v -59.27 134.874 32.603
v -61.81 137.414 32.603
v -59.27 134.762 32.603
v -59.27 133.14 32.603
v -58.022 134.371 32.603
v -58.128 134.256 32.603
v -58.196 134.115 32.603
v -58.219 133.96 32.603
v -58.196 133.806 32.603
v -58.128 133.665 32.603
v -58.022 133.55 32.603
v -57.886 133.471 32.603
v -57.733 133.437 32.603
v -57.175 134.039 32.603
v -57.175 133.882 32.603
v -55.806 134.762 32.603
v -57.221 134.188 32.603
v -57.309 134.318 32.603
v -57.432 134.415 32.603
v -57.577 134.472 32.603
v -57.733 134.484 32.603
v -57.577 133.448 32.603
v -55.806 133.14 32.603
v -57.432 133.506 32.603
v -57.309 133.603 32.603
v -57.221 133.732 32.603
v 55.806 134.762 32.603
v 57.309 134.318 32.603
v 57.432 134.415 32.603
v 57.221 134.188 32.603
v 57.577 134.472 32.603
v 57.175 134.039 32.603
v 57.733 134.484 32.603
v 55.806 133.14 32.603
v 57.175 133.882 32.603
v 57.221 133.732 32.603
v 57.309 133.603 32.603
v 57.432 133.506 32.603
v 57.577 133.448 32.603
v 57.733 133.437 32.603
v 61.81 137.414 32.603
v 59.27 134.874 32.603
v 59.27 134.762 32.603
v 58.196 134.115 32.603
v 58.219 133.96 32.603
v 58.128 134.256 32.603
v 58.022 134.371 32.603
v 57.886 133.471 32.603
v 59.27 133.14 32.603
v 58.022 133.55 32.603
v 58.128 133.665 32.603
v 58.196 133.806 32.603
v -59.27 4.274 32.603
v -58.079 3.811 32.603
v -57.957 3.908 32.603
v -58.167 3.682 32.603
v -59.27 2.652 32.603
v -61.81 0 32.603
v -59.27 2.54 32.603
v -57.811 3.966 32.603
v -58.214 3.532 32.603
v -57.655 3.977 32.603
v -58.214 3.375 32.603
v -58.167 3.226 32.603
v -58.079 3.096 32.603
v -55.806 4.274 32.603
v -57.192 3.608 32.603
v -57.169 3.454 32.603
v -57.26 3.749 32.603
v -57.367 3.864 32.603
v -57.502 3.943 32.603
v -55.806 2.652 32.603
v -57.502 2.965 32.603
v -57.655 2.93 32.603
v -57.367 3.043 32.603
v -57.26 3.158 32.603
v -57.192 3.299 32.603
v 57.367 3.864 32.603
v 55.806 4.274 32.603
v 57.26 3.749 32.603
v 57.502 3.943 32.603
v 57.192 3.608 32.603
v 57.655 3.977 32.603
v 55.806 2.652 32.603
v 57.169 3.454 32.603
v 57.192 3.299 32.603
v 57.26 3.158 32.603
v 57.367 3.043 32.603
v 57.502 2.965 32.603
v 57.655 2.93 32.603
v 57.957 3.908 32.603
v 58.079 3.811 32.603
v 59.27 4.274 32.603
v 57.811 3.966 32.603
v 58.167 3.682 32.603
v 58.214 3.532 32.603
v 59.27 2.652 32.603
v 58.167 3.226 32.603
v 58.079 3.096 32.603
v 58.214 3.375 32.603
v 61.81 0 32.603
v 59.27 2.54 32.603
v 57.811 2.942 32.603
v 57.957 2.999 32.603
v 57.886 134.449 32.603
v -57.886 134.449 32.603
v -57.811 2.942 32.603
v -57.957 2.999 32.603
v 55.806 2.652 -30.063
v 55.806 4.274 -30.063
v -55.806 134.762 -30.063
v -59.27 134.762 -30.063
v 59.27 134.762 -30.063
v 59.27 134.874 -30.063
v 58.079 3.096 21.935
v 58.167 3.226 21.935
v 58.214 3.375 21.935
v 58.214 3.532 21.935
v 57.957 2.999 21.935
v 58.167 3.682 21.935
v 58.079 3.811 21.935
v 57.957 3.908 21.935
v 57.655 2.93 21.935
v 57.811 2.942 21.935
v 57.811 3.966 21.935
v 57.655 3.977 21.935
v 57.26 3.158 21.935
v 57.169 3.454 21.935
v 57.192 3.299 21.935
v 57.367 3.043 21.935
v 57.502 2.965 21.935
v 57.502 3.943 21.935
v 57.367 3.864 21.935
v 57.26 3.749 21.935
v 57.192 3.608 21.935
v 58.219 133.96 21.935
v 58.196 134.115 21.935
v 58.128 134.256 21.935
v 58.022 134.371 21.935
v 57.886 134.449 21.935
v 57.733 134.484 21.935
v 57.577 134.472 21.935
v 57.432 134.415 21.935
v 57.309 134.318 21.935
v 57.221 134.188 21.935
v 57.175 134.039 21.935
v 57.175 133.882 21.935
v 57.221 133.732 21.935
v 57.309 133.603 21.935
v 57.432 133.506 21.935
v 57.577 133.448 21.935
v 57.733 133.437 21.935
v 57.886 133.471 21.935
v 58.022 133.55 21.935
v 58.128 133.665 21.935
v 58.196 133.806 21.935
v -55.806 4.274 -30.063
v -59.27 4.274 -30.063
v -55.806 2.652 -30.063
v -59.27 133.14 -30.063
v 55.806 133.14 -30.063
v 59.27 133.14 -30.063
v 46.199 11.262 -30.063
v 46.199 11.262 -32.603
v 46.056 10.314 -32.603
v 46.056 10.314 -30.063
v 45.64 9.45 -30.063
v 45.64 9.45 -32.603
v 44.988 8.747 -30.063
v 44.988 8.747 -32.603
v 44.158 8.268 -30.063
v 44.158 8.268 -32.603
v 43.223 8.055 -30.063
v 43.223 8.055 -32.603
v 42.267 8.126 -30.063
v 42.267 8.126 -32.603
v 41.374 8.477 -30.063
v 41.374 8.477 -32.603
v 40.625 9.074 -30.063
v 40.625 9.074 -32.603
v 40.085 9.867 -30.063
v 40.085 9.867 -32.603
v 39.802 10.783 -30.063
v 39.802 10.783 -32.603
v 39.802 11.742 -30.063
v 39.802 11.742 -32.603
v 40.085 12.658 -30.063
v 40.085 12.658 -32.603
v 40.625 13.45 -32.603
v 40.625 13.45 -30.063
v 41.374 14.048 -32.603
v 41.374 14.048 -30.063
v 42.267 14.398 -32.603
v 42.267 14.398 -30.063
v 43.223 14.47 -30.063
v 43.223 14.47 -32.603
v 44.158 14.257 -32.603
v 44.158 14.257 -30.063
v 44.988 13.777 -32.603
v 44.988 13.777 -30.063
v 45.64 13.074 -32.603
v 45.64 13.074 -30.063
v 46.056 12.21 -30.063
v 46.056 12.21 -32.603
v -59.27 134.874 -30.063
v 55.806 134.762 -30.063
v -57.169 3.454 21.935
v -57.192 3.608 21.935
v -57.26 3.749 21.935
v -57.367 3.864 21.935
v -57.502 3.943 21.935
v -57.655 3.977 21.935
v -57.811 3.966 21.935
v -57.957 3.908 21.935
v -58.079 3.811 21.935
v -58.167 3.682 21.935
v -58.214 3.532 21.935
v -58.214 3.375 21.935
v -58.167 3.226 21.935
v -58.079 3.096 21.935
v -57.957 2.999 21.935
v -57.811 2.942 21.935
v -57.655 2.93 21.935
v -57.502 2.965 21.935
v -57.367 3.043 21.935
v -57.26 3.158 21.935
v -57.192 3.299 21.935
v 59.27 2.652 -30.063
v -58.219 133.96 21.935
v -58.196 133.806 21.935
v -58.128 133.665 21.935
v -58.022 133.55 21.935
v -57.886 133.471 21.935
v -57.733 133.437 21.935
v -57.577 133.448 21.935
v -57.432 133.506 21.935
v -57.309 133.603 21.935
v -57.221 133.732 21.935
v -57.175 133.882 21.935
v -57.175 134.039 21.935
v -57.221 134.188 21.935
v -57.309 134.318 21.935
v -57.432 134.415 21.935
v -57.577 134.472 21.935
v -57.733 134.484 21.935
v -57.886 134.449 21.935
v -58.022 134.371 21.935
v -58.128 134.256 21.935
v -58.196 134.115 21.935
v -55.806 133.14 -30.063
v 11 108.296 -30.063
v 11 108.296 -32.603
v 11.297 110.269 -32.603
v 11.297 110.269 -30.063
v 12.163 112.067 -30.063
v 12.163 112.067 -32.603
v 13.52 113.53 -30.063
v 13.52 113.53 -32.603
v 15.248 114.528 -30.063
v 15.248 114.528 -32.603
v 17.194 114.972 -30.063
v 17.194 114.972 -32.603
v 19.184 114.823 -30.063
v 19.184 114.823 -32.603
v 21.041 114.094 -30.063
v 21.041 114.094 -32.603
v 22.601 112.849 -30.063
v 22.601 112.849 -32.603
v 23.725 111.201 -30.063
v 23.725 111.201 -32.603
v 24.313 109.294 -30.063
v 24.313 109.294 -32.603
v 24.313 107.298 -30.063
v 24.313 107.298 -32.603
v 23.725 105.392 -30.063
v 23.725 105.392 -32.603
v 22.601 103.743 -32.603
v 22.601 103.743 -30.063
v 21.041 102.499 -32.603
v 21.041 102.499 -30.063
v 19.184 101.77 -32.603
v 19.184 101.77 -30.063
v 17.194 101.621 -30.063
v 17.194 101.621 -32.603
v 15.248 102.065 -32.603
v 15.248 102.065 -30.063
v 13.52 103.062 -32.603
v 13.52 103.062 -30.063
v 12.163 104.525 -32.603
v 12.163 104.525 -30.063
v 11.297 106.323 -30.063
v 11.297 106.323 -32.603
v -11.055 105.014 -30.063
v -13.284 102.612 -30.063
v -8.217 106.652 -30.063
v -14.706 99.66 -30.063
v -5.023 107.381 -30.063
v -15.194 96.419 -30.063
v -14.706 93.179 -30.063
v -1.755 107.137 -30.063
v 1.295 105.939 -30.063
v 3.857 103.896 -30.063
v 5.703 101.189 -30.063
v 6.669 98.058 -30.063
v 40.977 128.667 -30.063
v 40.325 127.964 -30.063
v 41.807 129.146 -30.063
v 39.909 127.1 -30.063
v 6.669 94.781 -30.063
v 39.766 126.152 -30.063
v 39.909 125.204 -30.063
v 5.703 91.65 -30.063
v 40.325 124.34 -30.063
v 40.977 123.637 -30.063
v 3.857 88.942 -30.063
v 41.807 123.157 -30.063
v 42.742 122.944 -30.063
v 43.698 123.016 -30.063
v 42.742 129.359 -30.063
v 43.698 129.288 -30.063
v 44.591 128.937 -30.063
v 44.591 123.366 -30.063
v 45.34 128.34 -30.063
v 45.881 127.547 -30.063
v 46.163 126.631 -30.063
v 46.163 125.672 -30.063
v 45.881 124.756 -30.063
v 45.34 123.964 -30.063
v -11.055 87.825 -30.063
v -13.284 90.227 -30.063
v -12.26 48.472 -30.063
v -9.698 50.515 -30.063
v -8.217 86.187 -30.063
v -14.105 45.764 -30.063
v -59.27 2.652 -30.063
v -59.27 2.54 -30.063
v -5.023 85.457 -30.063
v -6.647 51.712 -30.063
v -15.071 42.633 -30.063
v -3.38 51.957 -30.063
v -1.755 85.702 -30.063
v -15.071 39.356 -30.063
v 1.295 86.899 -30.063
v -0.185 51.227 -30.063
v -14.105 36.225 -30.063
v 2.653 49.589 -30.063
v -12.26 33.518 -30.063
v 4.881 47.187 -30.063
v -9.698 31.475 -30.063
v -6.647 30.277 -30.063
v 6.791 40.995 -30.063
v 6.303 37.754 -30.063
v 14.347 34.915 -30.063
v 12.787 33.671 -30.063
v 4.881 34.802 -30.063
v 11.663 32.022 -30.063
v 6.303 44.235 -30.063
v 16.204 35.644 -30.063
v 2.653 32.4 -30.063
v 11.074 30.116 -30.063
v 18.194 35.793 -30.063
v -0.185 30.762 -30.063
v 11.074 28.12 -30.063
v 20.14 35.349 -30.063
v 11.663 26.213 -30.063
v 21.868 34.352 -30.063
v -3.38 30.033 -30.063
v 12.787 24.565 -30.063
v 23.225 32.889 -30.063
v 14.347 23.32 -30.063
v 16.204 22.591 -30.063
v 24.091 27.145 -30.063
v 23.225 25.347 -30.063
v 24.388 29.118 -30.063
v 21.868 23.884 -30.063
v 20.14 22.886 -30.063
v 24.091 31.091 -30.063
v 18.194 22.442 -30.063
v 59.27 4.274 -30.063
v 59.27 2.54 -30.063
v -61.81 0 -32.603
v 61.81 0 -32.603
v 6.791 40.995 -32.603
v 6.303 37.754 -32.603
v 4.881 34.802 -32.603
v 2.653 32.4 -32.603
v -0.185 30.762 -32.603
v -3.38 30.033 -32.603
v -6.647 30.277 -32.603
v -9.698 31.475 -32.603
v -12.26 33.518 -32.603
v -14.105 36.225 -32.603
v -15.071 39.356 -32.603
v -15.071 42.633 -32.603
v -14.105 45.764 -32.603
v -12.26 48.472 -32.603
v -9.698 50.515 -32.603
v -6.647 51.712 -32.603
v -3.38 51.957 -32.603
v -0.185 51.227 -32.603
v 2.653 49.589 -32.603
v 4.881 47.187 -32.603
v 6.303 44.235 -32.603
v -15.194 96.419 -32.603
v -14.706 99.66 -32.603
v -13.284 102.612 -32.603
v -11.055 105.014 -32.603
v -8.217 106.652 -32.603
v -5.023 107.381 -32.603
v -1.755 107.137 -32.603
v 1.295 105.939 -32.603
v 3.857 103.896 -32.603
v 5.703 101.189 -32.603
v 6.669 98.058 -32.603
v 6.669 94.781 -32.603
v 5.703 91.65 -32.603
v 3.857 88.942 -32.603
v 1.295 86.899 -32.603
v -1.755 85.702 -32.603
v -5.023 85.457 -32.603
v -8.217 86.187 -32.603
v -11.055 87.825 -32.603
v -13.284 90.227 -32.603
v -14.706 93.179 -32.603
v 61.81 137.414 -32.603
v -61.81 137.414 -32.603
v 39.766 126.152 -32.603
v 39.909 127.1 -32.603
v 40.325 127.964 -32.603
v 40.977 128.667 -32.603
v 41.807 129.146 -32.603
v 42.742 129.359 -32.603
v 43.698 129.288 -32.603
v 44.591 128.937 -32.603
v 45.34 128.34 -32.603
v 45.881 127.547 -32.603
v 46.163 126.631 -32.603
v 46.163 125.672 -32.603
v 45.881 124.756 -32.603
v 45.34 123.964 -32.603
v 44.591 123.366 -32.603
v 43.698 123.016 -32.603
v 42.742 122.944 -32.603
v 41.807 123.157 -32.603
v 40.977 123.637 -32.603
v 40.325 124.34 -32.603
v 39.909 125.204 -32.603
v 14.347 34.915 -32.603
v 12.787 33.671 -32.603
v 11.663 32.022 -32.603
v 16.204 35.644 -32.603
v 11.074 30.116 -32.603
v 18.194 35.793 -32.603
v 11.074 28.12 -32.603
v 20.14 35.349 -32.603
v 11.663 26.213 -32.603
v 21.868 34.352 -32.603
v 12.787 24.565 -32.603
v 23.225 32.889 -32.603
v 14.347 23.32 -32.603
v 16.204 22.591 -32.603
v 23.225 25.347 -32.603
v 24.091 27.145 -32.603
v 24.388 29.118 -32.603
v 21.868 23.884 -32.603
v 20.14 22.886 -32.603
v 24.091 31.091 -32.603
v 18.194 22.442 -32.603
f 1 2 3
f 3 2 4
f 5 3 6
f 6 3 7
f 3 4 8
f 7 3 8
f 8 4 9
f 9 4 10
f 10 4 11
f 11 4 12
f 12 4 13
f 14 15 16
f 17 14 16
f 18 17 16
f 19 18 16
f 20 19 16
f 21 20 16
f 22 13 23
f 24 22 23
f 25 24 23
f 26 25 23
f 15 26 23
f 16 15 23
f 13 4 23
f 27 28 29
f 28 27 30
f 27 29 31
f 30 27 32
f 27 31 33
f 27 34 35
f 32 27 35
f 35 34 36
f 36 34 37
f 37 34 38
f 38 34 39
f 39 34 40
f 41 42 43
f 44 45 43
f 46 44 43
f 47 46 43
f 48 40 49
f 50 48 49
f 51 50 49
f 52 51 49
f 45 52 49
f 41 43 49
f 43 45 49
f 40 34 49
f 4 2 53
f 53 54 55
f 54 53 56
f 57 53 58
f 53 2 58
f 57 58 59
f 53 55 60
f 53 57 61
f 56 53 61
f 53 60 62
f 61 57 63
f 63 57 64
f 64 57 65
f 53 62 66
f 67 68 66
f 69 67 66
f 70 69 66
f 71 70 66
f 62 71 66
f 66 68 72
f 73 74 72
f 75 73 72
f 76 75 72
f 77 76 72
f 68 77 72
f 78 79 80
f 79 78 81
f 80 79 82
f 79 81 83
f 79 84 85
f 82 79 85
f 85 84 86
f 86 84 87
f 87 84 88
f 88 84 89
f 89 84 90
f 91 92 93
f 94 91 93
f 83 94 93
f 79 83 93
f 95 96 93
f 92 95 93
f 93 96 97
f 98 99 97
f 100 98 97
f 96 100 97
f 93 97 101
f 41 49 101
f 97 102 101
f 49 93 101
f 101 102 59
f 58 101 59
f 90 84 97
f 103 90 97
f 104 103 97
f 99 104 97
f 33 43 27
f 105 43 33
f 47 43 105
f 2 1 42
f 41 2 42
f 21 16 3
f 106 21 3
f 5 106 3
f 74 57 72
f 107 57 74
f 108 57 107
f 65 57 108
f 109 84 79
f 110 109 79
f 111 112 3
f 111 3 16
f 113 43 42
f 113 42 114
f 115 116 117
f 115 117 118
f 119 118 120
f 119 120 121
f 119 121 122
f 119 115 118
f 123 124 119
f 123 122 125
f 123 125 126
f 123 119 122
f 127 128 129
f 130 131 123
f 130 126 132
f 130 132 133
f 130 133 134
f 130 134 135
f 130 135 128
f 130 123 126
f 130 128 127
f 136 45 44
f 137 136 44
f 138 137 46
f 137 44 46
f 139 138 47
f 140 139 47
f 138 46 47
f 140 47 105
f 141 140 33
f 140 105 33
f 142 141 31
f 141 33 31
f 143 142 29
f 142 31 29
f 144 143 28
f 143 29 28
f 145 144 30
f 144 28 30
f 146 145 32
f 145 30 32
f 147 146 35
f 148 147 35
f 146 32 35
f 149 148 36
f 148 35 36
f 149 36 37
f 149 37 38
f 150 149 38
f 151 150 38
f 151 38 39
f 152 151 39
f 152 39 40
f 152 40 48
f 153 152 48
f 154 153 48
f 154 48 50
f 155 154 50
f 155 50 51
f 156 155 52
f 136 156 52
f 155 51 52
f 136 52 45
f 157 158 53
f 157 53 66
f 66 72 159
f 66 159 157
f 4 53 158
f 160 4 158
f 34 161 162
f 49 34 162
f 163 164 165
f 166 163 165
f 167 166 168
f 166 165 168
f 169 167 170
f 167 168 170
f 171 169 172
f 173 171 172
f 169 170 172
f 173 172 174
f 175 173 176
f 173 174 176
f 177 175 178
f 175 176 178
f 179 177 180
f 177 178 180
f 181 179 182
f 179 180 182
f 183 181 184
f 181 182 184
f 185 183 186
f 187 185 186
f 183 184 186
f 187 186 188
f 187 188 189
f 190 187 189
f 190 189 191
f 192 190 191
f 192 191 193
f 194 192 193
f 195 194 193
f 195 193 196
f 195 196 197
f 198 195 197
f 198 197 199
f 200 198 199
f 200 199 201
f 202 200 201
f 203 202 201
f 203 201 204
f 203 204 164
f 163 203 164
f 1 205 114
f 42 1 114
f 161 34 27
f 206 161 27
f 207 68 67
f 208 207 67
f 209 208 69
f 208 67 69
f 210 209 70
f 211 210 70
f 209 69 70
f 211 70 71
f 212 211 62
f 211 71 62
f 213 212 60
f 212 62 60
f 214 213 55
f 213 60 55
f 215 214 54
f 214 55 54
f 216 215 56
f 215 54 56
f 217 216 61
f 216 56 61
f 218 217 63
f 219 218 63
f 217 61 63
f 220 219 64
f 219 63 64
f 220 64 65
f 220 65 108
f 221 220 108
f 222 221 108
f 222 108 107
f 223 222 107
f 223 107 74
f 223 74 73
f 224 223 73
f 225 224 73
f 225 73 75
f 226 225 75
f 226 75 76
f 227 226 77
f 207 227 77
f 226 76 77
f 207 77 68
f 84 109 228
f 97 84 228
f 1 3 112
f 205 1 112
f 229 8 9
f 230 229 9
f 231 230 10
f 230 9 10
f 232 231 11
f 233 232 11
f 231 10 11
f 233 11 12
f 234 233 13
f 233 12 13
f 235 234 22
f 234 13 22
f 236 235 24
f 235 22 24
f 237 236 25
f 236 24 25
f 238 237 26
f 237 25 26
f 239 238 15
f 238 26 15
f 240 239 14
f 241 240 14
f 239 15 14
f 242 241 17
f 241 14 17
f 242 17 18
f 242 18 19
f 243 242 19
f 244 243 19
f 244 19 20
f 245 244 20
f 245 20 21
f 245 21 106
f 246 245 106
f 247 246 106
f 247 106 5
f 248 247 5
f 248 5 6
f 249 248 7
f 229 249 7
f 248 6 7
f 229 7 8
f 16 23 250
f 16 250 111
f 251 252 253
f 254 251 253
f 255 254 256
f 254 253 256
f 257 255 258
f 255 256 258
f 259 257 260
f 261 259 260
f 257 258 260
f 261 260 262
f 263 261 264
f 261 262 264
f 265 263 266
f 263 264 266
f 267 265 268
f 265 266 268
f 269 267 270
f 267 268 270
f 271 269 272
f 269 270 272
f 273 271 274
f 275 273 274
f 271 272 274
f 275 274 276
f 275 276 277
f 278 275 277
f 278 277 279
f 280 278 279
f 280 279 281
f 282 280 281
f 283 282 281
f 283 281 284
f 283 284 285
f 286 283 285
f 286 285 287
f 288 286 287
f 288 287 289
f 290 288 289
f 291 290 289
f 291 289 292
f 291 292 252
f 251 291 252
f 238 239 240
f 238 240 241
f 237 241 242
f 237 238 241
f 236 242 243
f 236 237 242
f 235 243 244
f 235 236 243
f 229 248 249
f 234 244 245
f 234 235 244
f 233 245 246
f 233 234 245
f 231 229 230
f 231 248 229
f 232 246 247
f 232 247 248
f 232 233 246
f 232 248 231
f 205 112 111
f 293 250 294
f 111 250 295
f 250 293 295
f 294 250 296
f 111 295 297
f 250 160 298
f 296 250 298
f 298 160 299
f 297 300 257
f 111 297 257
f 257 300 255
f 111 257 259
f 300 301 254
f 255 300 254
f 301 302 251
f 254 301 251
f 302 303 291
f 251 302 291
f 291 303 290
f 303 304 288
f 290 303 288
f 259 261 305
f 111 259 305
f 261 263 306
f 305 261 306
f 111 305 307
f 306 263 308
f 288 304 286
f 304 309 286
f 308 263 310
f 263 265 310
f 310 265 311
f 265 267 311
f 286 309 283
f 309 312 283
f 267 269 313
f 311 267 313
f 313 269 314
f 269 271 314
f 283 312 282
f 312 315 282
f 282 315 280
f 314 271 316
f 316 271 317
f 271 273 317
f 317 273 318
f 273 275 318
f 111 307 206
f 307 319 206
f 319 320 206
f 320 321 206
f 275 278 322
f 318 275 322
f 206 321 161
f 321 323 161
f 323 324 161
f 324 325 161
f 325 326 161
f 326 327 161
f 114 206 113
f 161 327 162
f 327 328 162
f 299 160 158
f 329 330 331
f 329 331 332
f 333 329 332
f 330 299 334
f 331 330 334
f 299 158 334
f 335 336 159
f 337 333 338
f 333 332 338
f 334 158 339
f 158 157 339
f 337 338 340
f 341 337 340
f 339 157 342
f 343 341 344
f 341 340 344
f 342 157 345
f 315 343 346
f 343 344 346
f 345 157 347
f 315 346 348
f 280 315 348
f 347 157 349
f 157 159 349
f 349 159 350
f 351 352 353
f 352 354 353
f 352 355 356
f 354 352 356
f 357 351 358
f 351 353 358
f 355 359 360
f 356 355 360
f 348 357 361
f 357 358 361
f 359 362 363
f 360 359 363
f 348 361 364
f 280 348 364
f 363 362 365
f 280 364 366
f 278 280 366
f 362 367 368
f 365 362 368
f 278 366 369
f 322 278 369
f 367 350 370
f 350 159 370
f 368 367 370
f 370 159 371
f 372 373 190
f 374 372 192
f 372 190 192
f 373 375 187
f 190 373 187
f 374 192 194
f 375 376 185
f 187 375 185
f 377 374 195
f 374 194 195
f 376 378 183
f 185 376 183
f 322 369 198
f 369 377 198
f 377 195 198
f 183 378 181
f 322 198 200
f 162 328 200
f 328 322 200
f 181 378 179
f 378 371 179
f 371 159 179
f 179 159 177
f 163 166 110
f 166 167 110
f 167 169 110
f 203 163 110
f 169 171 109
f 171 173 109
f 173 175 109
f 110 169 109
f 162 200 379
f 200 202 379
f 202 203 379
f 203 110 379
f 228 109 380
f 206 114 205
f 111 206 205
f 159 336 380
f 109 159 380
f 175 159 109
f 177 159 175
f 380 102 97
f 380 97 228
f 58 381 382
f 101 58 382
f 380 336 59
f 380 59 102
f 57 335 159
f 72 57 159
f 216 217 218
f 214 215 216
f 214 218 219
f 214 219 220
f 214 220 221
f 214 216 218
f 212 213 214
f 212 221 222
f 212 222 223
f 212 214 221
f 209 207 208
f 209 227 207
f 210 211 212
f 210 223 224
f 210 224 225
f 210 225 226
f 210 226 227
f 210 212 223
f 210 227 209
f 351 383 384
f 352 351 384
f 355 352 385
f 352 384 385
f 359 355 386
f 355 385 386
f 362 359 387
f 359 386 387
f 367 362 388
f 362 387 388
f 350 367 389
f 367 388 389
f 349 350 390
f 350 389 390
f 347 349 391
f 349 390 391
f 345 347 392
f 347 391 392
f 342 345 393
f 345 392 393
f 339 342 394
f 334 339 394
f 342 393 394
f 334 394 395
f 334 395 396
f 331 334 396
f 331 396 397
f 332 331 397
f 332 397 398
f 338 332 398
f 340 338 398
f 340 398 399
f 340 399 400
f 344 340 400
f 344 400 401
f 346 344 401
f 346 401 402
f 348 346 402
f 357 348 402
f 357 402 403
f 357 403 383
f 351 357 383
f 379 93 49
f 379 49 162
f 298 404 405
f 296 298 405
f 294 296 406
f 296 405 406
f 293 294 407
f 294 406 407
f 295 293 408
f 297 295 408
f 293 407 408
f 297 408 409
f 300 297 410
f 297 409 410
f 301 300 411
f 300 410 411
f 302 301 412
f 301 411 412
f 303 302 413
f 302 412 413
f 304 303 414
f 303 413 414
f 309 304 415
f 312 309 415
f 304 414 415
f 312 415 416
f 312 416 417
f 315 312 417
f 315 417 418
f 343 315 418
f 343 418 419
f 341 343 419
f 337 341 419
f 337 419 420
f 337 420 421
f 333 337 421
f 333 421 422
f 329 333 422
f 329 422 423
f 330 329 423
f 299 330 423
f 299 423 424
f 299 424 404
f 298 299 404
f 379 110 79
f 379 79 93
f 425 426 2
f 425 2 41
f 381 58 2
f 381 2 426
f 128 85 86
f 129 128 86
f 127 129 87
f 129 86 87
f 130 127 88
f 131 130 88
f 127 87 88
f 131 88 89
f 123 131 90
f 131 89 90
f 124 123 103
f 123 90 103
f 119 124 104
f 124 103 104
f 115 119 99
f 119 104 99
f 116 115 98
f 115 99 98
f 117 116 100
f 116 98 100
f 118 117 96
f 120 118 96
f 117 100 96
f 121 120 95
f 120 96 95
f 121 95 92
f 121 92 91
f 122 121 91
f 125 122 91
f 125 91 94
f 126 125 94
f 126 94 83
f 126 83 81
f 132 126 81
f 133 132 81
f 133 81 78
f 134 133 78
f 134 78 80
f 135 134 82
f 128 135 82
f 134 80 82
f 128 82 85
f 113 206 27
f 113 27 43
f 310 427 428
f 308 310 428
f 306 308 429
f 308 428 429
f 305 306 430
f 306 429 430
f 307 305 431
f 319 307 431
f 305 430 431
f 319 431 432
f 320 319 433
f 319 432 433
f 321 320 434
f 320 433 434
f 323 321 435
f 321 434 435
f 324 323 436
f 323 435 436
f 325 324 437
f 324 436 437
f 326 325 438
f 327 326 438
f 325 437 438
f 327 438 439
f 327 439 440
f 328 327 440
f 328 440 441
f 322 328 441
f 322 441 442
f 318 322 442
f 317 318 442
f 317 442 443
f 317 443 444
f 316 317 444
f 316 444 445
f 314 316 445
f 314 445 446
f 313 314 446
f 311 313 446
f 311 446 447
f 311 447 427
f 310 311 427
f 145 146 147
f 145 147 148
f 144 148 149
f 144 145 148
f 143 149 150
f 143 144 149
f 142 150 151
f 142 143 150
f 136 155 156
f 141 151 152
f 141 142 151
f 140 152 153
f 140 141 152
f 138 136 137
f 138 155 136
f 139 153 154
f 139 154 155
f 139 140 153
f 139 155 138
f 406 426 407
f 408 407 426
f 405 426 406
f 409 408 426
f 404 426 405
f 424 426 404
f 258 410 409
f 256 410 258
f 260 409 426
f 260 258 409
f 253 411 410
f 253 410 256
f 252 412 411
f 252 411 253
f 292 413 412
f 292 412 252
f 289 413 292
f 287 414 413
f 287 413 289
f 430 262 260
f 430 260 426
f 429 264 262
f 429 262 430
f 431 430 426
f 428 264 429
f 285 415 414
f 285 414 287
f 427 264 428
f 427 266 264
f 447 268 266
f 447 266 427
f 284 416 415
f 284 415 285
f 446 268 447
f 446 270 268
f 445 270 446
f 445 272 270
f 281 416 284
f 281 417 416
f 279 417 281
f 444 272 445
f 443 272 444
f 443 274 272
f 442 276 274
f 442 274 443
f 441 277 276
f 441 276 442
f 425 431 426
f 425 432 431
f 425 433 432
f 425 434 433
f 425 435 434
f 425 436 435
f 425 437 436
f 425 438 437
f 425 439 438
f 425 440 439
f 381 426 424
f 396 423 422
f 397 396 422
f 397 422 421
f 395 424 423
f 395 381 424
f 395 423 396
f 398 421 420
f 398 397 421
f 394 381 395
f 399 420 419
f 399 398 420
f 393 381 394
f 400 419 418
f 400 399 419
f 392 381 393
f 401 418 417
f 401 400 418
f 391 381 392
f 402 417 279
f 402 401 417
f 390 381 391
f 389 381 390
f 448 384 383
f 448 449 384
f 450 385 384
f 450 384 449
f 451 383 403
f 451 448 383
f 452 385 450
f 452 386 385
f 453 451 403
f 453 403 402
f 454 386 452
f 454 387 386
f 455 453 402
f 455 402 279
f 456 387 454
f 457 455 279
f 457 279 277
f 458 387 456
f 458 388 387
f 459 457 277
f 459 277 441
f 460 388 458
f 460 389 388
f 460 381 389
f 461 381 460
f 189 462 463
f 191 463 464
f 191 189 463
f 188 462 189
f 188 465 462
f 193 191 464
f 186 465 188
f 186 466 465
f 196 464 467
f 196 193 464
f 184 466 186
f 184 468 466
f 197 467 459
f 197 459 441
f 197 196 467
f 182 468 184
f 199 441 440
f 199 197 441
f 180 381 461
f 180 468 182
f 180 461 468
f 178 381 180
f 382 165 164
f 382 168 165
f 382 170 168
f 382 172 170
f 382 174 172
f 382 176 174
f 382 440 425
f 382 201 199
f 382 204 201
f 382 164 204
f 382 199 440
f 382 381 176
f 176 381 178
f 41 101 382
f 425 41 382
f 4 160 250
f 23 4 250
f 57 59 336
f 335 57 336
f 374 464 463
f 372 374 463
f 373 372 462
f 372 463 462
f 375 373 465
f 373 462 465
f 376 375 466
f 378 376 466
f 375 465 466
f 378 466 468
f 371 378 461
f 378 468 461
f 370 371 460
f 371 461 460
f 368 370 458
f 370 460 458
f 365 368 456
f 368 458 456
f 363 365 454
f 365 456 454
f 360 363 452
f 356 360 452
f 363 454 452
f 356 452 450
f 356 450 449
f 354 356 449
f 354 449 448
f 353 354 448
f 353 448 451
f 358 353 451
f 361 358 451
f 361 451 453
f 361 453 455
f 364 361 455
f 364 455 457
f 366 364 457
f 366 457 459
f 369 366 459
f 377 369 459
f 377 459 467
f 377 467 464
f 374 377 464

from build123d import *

# Parameters (mm, degrees)
SKETCH1_W           = 123.619311202
SKETCH1_H           = 65.206161616
BOSS_EXTRUDE1_DEPTH = 137.414
SHELL1_T            = -2.54
SKETCH2_R           = 3.216585951
SKETCH2_R_2         = 6.694232597
SKETCH2_R_3         = 10.992771438
CUT_EXTRUDE1_DEPTH  = 137.414
SKETCH3_W           = 3.463459185
SKETCH3_H           = 1.622403572
BOSS_EXTRUDE2_DEPTH = 62.666161616
SKETCH4_R           = 0.525209506
CUT_EXTRUDE2_DEPTH  = 10.668


with BuildPart() as part:
    # Sketch1 → Boss-Extrude1 (new body)
    with BuildSketch(Plane(origin=(0, 0, 0), x_dir=(1, 0, 0), z_dir=(0, 1, 0))):
        Rectangle(SKETCH1_W, SKETCH1_H)
    extrude(amount=BOSS_EXTRUDE1_DEPTH)

    # Shell1
    shell1_openings = [part.faces().sort_by_distance(p)[0] for p in [
        (0, 68.707, 32.603080808),
    ]]
    offset(amount=SHELL1_T, openings=shell1_openings, kind=Kind.INTERSECTION)

    # Sketch2 → Cut-Extrude1 (cut)
    with BuildSketch(Plane(origin=(0, 0, -32.603080808), x_dir=(-1, 0, 0), z_dir=(0, 0, -1))):
        with Locations((-42.982548284, 126.151721485)):
            Circle(SKETCH2_R)
        with Locations((-17.693943749, 108.296189209)):
            Circle(SKETCH2_R_2)
        with Locations((4.201301712, 96.419432446)):
            Circle(SKETCH2_R_3)
        with Locations(Location((4.201301712, 40.994567554, 0), (0, 0, 180))):
            Circle(SKETCH2_R_3)
        with Locations(Location((-17.693943749, 29.117810791, 0), (0, 0, 180))):
            Circle(SKETCH2_R_2)
        with Locations(Location((-42.982548284, 11.262278515, 0), (0, 0, 180))):
            Circle(SKETCH2_R)
    extrude(amount=-CUT_EXTRUDE1_DEPTH, mode=Mode.SUBTRACT)

    # Sketch3 → Boss-Extrude2 (add)
    with BuildSketch(Plane.XY.offset(-30.063080808)):
        with Locations((57.537926009, 133.950956633)):
            Rectangle(SKETCH3_W, SKETCH3_H)
        with Locations((-57.537926009, 133.950956633)):
            Rectangle(SKETCH3_W, SKETCH3_H)
        with Locations((-57.537926009, 3.463043367)):
            Rectangle(SKETCH3_W, SKETCH3_H)
        with Locations((57.537926009, 3.463043367)):
            Rectangle(SKETCH3_W, SKETCH3_H)
    extrude(amount=BOSS_EXTRUDE2_DEPTH)

    # Sketch4 → Cut-Extrude2 (cut)
    with BuildSketch(Plane.XY.offset(32.603080808)):
        with Locations((57.694217547, 133.960377278)):
            Circle(SKETCH4_R)
        with Locations(Location((-57.694217547, 133.960377278, 0), (0, 0, 180))):
            Circle(SKETCH4_R)
        with Locations(Location((57.694217547, 3.453622722, 0), (0, 0, 180))):
            Circle(SKETCH4_R)
        with Locations((-57.694217547, 3.453622722)):
            Circle(SKETCH4_R)
    extrude(amount=-CUT_EXTRUDE2_DEPTH, mode=Mode.SUBTRACT)


solid = part.part
